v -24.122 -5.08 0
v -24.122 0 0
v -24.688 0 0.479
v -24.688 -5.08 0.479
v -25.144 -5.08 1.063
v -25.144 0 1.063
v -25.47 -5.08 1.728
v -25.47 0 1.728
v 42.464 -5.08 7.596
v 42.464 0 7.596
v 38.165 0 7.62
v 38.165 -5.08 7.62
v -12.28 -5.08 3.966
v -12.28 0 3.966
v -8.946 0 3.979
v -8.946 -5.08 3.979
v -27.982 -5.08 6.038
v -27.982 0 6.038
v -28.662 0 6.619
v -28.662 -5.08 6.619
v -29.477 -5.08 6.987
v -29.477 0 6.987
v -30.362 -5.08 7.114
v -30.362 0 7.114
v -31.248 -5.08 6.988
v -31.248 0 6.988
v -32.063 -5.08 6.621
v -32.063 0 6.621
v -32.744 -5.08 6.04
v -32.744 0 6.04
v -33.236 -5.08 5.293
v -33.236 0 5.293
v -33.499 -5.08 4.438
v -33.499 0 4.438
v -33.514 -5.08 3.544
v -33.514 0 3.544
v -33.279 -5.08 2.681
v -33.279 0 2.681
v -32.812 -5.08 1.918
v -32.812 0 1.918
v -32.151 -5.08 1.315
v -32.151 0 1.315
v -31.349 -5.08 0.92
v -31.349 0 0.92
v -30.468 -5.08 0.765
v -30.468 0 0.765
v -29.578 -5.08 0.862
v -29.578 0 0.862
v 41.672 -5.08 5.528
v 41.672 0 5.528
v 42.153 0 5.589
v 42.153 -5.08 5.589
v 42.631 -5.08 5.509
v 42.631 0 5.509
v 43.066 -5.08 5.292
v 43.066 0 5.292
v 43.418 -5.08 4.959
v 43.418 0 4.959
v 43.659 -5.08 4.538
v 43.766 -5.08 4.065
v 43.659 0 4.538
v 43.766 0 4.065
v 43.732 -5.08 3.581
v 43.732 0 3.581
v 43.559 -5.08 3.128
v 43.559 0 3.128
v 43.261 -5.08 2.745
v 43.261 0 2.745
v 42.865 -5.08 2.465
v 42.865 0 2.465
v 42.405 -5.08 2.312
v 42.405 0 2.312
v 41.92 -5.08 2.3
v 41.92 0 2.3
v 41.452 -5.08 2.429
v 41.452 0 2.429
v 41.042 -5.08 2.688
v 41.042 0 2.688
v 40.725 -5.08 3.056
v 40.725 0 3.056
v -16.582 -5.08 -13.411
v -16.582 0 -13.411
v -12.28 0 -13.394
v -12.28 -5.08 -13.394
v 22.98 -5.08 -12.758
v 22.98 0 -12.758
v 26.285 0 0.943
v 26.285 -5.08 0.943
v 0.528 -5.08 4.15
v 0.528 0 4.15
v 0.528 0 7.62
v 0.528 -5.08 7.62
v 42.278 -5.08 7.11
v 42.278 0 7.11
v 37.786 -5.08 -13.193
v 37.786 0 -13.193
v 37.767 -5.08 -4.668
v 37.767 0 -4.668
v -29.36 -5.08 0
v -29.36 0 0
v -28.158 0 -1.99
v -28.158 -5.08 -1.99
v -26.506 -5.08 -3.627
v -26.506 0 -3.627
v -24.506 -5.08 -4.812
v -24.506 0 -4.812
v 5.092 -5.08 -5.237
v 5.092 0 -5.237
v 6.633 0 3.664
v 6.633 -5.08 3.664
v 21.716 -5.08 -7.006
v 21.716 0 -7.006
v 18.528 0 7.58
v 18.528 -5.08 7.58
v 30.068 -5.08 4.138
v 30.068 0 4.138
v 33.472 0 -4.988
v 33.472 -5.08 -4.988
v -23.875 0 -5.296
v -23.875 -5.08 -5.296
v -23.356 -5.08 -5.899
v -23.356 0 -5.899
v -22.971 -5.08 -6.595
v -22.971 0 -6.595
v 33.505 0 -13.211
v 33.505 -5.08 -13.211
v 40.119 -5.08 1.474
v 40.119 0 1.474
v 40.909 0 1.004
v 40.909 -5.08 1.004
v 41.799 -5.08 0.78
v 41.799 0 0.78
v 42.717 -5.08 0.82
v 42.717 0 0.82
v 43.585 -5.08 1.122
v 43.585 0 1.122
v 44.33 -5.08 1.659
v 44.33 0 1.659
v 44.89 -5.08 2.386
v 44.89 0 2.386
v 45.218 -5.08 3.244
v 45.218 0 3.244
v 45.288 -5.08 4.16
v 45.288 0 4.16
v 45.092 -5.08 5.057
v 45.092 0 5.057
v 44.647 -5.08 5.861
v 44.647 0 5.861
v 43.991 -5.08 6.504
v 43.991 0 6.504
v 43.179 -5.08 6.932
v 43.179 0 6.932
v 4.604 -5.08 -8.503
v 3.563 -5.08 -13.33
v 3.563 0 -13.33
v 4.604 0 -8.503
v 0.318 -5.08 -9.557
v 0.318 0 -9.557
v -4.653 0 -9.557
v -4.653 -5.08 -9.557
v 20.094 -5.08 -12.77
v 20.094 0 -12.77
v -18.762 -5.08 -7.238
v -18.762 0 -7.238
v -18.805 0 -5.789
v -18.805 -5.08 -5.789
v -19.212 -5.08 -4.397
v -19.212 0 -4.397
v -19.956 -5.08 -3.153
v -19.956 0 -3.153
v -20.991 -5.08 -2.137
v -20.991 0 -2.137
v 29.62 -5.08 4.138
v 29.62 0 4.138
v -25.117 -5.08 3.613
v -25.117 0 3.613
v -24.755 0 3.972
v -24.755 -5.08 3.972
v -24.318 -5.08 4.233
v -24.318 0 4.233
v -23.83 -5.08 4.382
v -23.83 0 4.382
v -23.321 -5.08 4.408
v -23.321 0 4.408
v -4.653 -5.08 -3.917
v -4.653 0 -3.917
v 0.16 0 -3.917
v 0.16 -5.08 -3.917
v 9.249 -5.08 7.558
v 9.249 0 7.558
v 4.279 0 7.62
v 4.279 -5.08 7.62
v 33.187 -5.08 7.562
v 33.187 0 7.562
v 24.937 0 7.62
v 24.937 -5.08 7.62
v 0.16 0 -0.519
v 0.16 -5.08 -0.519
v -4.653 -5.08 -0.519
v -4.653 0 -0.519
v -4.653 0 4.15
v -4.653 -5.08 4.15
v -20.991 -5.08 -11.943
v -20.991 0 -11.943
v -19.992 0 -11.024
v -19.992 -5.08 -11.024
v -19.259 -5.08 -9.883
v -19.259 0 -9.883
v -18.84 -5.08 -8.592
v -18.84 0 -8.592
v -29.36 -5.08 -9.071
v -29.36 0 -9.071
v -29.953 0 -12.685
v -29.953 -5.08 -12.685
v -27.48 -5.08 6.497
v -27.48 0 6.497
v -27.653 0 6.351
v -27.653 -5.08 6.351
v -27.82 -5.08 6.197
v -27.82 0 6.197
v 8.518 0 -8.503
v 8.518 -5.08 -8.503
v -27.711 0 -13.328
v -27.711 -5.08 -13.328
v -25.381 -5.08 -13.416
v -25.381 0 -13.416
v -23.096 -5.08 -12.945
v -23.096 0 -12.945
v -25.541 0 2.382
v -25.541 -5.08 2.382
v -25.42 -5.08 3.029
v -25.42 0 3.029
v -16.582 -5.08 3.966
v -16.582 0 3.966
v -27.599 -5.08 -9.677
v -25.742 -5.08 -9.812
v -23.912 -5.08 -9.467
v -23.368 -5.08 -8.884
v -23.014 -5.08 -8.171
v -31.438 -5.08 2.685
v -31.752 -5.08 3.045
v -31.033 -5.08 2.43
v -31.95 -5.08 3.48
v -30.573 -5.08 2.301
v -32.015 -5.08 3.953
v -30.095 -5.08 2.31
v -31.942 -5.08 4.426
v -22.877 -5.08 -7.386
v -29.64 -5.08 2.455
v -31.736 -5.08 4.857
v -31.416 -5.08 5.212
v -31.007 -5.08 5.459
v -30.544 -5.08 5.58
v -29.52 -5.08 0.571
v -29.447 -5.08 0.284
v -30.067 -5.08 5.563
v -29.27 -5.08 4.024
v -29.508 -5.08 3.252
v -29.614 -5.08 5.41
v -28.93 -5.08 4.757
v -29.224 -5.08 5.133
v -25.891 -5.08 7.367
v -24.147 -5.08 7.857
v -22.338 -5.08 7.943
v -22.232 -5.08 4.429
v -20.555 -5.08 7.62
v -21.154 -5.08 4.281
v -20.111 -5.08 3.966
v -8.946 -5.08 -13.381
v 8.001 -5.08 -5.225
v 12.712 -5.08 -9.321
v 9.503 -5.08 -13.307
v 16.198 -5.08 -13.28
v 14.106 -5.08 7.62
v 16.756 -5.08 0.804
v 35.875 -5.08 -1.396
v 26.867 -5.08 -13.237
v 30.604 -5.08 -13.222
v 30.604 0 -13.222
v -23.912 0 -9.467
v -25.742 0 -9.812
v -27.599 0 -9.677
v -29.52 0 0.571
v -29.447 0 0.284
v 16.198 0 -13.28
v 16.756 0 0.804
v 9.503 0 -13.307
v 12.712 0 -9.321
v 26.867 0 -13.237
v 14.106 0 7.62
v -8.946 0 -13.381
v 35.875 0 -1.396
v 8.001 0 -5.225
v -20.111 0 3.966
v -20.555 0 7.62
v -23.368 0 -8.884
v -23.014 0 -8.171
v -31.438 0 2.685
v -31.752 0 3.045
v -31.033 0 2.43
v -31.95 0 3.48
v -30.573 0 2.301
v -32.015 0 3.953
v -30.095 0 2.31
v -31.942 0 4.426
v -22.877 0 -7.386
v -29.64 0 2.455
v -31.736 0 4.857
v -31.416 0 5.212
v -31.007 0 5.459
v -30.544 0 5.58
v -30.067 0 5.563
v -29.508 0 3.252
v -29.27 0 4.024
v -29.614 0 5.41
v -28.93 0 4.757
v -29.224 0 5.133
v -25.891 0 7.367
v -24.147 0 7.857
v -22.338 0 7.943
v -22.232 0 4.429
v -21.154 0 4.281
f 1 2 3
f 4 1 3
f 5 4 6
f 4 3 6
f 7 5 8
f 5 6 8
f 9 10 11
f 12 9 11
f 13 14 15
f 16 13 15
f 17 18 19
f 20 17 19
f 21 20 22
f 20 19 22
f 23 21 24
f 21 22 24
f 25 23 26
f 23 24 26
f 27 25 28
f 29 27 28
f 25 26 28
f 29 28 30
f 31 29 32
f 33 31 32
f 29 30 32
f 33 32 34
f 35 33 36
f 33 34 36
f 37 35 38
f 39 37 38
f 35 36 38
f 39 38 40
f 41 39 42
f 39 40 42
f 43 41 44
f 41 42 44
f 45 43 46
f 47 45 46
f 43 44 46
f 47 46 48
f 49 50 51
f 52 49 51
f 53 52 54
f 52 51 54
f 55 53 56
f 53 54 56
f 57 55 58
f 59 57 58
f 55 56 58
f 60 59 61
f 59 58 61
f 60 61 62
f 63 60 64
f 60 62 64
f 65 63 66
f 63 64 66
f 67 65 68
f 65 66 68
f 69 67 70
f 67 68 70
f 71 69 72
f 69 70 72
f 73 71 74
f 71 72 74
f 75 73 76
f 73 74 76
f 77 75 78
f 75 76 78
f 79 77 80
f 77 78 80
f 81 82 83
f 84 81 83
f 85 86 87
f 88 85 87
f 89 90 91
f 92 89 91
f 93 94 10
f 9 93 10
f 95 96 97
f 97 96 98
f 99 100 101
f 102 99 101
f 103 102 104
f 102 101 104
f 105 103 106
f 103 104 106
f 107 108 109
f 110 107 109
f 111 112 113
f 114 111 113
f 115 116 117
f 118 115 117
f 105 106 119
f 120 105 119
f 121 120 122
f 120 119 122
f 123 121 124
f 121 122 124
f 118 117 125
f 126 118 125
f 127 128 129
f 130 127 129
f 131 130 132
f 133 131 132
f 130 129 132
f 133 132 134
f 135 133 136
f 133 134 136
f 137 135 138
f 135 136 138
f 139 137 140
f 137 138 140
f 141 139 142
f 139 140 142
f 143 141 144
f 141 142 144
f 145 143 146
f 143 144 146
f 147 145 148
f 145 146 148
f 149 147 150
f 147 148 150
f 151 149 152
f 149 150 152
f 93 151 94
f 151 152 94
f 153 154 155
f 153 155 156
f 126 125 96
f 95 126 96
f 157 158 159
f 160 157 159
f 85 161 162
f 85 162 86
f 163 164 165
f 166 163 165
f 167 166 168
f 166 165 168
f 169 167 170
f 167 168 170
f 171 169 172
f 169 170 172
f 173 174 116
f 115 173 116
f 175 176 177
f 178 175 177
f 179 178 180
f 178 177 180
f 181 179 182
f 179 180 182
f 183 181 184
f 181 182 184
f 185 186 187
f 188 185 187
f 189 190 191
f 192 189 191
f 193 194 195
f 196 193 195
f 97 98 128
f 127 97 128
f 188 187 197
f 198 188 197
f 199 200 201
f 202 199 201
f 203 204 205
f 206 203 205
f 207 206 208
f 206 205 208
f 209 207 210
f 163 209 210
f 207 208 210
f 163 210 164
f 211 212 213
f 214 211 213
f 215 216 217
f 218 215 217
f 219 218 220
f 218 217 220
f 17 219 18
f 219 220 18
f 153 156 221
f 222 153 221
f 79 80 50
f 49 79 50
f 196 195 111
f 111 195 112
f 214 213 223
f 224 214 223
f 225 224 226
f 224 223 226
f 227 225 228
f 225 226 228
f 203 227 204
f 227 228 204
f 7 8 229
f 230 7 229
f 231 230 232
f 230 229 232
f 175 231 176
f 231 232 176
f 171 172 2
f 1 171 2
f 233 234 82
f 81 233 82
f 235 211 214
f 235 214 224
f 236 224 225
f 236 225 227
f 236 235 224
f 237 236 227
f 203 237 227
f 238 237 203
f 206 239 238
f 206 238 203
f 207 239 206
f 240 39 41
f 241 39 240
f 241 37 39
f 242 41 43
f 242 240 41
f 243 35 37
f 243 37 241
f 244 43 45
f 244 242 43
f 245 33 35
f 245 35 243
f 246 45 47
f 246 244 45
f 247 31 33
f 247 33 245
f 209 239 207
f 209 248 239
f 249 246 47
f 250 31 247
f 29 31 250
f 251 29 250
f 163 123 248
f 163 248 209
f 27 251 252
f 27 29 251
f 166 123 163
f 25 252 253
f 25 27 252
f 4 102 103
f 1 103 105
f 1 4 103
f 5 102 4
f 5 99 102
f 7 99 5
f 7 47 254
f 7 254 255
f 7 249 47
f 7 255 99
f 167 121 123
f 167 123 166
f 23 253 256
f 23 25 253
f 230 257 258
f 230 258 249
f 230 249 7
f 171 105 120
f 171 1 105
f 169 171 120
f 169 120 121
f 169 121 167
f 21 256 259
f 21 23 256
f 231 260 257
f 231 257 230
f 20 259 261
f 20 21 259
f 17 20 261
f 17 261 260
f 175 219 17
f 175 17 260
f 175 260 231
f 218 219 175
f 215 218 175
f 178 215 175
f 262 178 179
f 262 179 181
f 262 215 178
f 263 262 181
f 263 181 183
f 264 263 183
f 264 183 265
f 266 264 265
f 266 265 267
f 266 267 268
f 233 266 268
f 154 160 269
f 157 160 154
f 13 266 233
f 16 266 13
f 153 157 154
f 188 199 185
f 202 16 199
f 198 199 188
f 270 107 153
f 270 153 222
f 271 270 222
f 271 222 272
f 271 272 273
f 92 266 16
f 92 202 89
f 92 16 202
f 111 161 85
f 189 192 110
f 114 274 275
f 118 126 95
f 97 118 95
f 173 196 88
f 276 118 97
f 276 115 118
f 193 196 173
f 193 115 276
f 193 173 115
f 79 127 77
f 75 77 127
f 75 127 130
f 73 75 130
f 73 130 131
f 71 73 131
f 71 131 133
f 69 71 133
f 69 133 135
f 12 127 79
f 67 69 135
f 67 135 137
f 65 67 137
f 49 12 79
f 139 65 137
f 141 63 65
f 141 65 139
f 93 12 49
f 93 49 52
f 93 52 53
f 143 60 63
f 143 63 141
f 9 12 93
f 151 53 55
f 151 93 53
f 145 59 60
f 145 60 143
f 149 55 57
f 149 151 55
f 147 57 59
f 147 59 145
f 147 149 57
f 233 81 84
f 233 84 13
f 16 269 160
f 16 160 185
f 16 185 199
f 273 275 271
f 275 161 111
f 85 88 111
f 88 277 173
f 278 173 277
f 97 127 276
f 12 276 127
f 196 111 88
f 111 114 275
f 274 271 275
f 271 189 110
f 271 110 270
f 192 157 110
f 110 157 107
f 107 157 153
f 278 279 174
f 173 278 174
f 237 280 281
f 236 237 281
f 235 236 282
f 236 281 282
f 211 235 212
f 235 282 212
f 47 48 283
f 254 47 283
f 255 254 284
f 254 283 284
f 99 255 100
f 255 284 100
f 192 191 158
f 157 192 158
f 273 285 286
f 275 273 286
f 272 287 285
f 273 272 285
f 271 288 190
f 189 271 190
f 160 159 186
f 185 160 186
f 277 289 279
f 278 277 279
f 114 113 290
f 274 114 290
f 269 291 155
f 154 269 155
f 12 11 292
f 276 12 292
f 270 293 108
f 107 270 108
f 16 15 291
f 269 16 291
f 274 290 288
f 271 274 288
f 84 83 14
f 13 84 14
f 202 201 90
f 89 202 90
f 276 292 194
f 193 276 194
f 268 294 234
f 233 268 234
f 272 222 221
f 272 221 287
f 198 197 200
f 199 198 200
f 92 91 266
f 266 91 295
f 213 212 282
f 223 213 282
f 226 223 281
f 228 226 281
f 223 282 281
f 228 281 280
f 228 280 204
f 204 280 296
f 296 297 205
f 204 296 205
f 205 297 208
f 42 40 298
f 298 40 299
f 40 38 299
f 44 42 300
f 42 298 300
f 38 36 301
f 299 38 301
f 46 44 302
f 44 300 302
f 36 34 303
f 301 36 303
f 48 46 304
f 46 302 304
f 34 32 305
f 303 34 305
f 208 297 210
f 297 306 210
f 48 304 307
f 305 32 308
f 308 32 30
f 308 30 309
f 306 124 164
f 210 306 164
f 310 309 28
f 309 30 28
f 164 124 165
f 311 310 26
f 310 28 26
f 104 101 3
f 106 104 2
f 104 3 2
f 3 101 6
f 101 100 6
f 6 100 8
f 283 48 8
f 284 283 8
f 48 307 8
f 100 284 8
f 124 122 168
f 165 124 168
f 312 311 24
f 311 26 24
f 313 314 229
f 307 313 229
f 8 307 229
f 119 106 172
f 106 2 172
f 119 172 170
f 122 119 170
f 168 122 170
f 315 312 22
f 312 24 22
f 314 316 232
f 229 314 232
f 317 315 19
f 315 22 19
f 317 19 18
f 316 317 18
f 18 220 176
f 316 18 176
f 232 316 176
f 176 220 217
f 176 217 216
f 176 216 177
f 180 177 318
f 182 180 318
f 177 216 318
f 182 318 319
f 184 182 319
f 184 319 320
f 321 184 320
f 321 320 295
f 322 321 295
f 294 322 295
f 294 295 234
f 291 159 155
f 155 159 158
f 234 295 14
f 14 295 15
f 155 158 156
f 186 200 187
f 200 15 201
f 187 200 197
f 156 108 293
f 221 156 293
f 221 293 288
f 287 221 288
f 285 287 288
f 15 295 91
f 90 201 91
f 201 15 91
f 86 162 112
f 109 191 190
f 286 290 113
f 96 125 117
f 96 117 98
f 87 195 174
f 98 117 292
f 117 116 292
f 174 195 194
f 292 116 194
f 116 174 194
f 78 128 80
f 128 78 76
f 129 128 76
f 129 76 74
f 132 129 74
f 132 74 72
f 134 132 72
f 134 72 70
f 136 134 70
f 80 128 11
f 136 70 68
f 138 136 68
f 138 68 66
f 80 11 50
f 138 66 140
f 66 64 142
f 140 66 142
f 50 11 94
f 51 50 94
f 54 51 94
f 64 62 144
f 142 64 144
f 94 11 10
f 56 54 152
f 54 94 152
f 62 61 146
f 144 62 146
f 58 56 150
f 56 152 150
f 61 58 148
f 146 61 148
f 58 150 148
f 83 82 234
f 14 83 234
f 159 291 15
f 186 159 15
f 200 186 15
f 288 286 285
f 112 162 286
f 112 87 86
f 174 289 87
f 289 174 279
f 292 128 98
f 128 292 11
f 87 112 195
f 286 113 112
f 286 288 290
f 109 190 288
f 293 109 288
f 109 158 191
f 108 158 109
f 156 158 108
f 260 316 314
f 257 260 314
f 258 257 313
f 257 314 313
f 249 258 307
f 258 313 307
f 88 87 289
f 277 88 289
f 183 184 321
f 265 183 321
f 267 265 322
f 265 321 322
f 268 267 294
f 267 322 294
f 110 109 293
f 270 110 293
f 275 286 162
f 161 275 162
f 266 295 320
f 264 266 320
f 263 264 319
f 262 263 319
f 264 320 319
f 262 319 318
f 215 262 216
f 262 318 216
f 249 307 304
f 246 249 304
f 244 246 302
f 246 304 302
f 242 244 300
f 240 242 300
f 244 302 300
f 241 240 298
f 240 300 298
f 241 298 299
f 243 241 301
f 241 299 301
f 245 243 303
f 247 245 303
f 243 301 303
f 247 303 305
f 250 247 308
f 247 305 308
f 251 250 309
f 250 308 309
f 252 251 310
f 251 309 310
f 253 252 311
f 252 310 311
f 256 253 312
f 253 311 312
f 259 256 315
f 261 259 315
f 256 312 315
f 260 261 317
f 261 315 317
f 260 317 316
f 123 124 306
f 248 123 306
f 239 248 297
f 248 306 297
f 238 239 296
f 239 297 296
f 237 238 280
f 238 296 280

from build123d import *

# Parameters (mm, degrees)
F1_DEPTH = 5.08


# Not quite as in the source:
# - a feature names something its author has since deleted; it is built from what else it names


with BuildPart() as f1:
    # F0 (on Front) → F1 (new body)
    with BuildSketch(Plane.XZ):
        with BuildLine():
            Line((0.5275796089, 7.6204063303), (-20.5549836386, 7.6204063303))
            ThreePointArc((-20.5549836386, 7.6204063303), (-24.1470852619, 7.8573171504), (-27.4802406014, 6.4973920455))
            ThreePointArc((-27.4802406014, 6.4973920455), (-27.7375034402, 6.2746595983), (-27.981620644, 6.0375927257))
            ThreePointArc((-27.981620644, 6.0375927257), (-33.397838822, 4.8748506486), (-29.5783585742, 0.8624998257))
            ThreePointArc((-29.5783585742, 0.8624998257), (-29.4854309268, 0.4271699147), (-29.3602369053, 0))
            ThreePointArc((-29.3602369053, 0), (-27.3824789798, -2.8590960671), (-24.506347845, -4.8119981201))
            ThreePointArc((-24.506347845, -4.8119981201), (-23.6004229251, -5.5841706159), (-22.9712673668, -6.5946722771))
            ThreePointArc((-22.9712673668, -6.5946722771), (-23.0136087347, -8.1709506956), (-23.9121225745, -9.4667590625))
            ThreePointArc((-23.9121225745, -9.4667590625), (-26.6751520356, -9.8046566121), (-29.3602369053, -9.070609066))
            Line((-29.3602369053, -9.070609066), (-29.9534098835, -12.6854763365))
            ThreePointArc((-29.9534098835, -12.6854763365), (-25.3805938493, -13.4163192517), (-20.9905179357, -11.942544736))
            ThreePointArc((-20.9905179357, -11.942544736), (-19.2592379489, -9.8825014175), (-18.7621753773, -7.2378771215))
            ThreePointArc((-18.7621753773, -7.2378771215), (-19.211874139, -4.3971723931), (-20.9905179357, -2.1370266953))
            Line((-20.9905179357, -2.1370266953), (-24.1216853728, 0))
            ThreePointArc((-24.1216853728, 0), (-24.9307297161, 0.7590940477), (-25.4702806832, 1.7284553202))
            ThreePointArc((-25.4702806832, 1.7284553202), (-25.5043476571, 2.7102503227), (-25.1169531372, 3.6130279651))
            ThreePointArc((-25.1169531372, 3.6130279651), (-24.3175410864, 4.2333674235), (-23.3208688715, 4.4080819527))
            ThreePointArc((-23.3208688715, 4.4080819527), (-21.6899521733, 4.3761370029), (-20.1111126275, 3.9660450076))
            Line((-20.1111126275, 3.9660450076), (-16.5822823859, 3.9660450076))
            Line((-16.5822823859, 3.9660450076), (-16.5822823859, -13.4110949968))
            Line((-16.5822823859, -13.4110949968), (-12.2804131329, -13.3938708772))
            Line((-12.2804131329, -13.3938708772), (-12.2804131329, 3.9660450076))
            Line((-12.2804131329, 3.9660450076), (-8.945503985, 3.9793975459))
            Line((-8.945503985, 3.9793975459), (-8.945503985, -13.3805183388))
            Line((-8.945503985, -13.3805183388), (3.5631158198, -13.3304354676))
            Line((3.5631158198, -13.3304354676), (4.6038833267, -8.5034191039))
            Line((4.6038833267, -8.5034191039), (8.5180552324, -8.5034191039))
            Line((8.5180552324, -8.5034191039), (9.5034663795, -13.306651084))
            Line((9.5034663795, -13.306651084), (16.1975384964, -13.2798488983))
            Line((16.1975384964, -13.2798488983), (16.7558157547, 0.8041785421))
            Line((16.7558157547, 0.8041785421), (20.0938722411, -12.7696729569))
            Line((20.0938722411, -12.7696729569), (22.9795774261, -12.7581189723))
            Line((22.9795774261, -12.7581189723), (26.2847394813, 0.9427291897))
            Line((26.2847394813, 0.9427291897), (26.8666385735, -13.2371312225))
            Line((26.8666385735, -13.2371312225), (30.6037896767, -13.2221681602))
            Line((30.6037896767, -13.2221681602), (29.6197104597, 4.1383008359))
            Line((29.6197104597, 4.1383008359), (30.0681198915, 4.1383008359))
            Line((30.0681198915, 4.1383008359), (33.4722819544, -4.9878930799))
            Line((33.4722819544, -4.9878930799), (33.5052043981, -13.2105512767))
            Line((33.5052043981, -13.2105512767), (37.7860251854, -13.1934114324))
            Line((37.7860251854, -13.1934114324), (37.7674589547, -4.6679620266))
            Line((37.7674589547, -4.6679620266), (40.1194626421, 1.4735250723))
            ThreePointArc((40.1194626421, 1.4735250723), (45.0852633427, 2.8032642571), (42.2780045043, 7.1098499943))
            Line((42.2780045043, 7.1098499943), (42.4643497057, 7.59642944))
            Line((42.4643497057, 7.59642944), (38.1647445225, 7.6204063303))
            Line((38.1647445225, 7.6204063303), (35.8745108519, -1.3959297124))
            Line((35.8745108519, -1.3959297124), (33.1867010158, 7.5616615339))
            Line((33.1867010158, 7.5616615339), (24.9374744272, 7.6204063303))
            Line((24.9374744272, 7.6204063303), (21.7155495368, -7.0057700086))
            Line((21.7155495368, -7.0057700086), (18.5282991894, 7.5796761978))
            Line((18.5282991894, 7.5796761978), (14.1064790639, 7.6204063303))
            Line((14.1064790639, 7.6204063303), (12.7121774264, -9.3207750149))
            Line((12.7121774264, -9.3207750149), (9.2494001455, 7.5579893706))
            Line((9.2494001455, 7.5579893706), (4.2787034967, 7.6204063303))
            Line((4.2787034967, 7.6204063303), (0.3177259894, -9.5568800665))
            Line((0.3177259894, -9.5568800665), (-4.6531687161, -9.5568800665))
            Line((-4.6531687161, -9.5568800665), (-4.6531687161, -3.916612915))
            Line((-4.6531687161, -3.916612915), (0.1603365073, -3.916612915))
            Line((0.1603365073, -3.916612915), (0.1603365073, -0.5193359287))
            Line((0.1603365073, -0.5193359287), (-4.6531687161, -0.5193359287))
            Line((-4.6531687161, -0.5193359287), (-4.6531687161, 4.1502808179))
            Line((-4.6531687161, 4.1502808179), (0.5275796089, 4.1502808179))
            Line((0.5275796089, 4.1502808179), (0.5275796089, 7.6204063303))
        make_face()
        with BuildLine():
            ThreePointArc((-29.6399717805, 2.4549812242), (-31.9415802033, 4.4255324591), (-28.929800391, 4.7566757264))
            ThreePointArc((-28.929800391, 4.7566757264), (-29.4025078793, 3.6421198391), (-29.6399717805, 2.4549812242))
        make_face(mode=Mode.SUBTRACT)
        Polygon((8.0009574376, -5.2250216365), (5.0922911755, -5.2366675543), (6.6333247161, 3.6641330811), align=None, mode=Mode.SUBTRACT)
        with BuildLine():
            ThreePointArc((41.6721226179, 5.5277879385), (43.6620613807, 3.3483075355), (40.7253445285, 3.0555871281))
            Line((40.7253445285, 3.0555871281), (41.6721226179, 5.5277879385))
        make_face(mode=Mode.SUBTRACT)
    extrude(amount=F1_DEPTH)


solid = f1.part
